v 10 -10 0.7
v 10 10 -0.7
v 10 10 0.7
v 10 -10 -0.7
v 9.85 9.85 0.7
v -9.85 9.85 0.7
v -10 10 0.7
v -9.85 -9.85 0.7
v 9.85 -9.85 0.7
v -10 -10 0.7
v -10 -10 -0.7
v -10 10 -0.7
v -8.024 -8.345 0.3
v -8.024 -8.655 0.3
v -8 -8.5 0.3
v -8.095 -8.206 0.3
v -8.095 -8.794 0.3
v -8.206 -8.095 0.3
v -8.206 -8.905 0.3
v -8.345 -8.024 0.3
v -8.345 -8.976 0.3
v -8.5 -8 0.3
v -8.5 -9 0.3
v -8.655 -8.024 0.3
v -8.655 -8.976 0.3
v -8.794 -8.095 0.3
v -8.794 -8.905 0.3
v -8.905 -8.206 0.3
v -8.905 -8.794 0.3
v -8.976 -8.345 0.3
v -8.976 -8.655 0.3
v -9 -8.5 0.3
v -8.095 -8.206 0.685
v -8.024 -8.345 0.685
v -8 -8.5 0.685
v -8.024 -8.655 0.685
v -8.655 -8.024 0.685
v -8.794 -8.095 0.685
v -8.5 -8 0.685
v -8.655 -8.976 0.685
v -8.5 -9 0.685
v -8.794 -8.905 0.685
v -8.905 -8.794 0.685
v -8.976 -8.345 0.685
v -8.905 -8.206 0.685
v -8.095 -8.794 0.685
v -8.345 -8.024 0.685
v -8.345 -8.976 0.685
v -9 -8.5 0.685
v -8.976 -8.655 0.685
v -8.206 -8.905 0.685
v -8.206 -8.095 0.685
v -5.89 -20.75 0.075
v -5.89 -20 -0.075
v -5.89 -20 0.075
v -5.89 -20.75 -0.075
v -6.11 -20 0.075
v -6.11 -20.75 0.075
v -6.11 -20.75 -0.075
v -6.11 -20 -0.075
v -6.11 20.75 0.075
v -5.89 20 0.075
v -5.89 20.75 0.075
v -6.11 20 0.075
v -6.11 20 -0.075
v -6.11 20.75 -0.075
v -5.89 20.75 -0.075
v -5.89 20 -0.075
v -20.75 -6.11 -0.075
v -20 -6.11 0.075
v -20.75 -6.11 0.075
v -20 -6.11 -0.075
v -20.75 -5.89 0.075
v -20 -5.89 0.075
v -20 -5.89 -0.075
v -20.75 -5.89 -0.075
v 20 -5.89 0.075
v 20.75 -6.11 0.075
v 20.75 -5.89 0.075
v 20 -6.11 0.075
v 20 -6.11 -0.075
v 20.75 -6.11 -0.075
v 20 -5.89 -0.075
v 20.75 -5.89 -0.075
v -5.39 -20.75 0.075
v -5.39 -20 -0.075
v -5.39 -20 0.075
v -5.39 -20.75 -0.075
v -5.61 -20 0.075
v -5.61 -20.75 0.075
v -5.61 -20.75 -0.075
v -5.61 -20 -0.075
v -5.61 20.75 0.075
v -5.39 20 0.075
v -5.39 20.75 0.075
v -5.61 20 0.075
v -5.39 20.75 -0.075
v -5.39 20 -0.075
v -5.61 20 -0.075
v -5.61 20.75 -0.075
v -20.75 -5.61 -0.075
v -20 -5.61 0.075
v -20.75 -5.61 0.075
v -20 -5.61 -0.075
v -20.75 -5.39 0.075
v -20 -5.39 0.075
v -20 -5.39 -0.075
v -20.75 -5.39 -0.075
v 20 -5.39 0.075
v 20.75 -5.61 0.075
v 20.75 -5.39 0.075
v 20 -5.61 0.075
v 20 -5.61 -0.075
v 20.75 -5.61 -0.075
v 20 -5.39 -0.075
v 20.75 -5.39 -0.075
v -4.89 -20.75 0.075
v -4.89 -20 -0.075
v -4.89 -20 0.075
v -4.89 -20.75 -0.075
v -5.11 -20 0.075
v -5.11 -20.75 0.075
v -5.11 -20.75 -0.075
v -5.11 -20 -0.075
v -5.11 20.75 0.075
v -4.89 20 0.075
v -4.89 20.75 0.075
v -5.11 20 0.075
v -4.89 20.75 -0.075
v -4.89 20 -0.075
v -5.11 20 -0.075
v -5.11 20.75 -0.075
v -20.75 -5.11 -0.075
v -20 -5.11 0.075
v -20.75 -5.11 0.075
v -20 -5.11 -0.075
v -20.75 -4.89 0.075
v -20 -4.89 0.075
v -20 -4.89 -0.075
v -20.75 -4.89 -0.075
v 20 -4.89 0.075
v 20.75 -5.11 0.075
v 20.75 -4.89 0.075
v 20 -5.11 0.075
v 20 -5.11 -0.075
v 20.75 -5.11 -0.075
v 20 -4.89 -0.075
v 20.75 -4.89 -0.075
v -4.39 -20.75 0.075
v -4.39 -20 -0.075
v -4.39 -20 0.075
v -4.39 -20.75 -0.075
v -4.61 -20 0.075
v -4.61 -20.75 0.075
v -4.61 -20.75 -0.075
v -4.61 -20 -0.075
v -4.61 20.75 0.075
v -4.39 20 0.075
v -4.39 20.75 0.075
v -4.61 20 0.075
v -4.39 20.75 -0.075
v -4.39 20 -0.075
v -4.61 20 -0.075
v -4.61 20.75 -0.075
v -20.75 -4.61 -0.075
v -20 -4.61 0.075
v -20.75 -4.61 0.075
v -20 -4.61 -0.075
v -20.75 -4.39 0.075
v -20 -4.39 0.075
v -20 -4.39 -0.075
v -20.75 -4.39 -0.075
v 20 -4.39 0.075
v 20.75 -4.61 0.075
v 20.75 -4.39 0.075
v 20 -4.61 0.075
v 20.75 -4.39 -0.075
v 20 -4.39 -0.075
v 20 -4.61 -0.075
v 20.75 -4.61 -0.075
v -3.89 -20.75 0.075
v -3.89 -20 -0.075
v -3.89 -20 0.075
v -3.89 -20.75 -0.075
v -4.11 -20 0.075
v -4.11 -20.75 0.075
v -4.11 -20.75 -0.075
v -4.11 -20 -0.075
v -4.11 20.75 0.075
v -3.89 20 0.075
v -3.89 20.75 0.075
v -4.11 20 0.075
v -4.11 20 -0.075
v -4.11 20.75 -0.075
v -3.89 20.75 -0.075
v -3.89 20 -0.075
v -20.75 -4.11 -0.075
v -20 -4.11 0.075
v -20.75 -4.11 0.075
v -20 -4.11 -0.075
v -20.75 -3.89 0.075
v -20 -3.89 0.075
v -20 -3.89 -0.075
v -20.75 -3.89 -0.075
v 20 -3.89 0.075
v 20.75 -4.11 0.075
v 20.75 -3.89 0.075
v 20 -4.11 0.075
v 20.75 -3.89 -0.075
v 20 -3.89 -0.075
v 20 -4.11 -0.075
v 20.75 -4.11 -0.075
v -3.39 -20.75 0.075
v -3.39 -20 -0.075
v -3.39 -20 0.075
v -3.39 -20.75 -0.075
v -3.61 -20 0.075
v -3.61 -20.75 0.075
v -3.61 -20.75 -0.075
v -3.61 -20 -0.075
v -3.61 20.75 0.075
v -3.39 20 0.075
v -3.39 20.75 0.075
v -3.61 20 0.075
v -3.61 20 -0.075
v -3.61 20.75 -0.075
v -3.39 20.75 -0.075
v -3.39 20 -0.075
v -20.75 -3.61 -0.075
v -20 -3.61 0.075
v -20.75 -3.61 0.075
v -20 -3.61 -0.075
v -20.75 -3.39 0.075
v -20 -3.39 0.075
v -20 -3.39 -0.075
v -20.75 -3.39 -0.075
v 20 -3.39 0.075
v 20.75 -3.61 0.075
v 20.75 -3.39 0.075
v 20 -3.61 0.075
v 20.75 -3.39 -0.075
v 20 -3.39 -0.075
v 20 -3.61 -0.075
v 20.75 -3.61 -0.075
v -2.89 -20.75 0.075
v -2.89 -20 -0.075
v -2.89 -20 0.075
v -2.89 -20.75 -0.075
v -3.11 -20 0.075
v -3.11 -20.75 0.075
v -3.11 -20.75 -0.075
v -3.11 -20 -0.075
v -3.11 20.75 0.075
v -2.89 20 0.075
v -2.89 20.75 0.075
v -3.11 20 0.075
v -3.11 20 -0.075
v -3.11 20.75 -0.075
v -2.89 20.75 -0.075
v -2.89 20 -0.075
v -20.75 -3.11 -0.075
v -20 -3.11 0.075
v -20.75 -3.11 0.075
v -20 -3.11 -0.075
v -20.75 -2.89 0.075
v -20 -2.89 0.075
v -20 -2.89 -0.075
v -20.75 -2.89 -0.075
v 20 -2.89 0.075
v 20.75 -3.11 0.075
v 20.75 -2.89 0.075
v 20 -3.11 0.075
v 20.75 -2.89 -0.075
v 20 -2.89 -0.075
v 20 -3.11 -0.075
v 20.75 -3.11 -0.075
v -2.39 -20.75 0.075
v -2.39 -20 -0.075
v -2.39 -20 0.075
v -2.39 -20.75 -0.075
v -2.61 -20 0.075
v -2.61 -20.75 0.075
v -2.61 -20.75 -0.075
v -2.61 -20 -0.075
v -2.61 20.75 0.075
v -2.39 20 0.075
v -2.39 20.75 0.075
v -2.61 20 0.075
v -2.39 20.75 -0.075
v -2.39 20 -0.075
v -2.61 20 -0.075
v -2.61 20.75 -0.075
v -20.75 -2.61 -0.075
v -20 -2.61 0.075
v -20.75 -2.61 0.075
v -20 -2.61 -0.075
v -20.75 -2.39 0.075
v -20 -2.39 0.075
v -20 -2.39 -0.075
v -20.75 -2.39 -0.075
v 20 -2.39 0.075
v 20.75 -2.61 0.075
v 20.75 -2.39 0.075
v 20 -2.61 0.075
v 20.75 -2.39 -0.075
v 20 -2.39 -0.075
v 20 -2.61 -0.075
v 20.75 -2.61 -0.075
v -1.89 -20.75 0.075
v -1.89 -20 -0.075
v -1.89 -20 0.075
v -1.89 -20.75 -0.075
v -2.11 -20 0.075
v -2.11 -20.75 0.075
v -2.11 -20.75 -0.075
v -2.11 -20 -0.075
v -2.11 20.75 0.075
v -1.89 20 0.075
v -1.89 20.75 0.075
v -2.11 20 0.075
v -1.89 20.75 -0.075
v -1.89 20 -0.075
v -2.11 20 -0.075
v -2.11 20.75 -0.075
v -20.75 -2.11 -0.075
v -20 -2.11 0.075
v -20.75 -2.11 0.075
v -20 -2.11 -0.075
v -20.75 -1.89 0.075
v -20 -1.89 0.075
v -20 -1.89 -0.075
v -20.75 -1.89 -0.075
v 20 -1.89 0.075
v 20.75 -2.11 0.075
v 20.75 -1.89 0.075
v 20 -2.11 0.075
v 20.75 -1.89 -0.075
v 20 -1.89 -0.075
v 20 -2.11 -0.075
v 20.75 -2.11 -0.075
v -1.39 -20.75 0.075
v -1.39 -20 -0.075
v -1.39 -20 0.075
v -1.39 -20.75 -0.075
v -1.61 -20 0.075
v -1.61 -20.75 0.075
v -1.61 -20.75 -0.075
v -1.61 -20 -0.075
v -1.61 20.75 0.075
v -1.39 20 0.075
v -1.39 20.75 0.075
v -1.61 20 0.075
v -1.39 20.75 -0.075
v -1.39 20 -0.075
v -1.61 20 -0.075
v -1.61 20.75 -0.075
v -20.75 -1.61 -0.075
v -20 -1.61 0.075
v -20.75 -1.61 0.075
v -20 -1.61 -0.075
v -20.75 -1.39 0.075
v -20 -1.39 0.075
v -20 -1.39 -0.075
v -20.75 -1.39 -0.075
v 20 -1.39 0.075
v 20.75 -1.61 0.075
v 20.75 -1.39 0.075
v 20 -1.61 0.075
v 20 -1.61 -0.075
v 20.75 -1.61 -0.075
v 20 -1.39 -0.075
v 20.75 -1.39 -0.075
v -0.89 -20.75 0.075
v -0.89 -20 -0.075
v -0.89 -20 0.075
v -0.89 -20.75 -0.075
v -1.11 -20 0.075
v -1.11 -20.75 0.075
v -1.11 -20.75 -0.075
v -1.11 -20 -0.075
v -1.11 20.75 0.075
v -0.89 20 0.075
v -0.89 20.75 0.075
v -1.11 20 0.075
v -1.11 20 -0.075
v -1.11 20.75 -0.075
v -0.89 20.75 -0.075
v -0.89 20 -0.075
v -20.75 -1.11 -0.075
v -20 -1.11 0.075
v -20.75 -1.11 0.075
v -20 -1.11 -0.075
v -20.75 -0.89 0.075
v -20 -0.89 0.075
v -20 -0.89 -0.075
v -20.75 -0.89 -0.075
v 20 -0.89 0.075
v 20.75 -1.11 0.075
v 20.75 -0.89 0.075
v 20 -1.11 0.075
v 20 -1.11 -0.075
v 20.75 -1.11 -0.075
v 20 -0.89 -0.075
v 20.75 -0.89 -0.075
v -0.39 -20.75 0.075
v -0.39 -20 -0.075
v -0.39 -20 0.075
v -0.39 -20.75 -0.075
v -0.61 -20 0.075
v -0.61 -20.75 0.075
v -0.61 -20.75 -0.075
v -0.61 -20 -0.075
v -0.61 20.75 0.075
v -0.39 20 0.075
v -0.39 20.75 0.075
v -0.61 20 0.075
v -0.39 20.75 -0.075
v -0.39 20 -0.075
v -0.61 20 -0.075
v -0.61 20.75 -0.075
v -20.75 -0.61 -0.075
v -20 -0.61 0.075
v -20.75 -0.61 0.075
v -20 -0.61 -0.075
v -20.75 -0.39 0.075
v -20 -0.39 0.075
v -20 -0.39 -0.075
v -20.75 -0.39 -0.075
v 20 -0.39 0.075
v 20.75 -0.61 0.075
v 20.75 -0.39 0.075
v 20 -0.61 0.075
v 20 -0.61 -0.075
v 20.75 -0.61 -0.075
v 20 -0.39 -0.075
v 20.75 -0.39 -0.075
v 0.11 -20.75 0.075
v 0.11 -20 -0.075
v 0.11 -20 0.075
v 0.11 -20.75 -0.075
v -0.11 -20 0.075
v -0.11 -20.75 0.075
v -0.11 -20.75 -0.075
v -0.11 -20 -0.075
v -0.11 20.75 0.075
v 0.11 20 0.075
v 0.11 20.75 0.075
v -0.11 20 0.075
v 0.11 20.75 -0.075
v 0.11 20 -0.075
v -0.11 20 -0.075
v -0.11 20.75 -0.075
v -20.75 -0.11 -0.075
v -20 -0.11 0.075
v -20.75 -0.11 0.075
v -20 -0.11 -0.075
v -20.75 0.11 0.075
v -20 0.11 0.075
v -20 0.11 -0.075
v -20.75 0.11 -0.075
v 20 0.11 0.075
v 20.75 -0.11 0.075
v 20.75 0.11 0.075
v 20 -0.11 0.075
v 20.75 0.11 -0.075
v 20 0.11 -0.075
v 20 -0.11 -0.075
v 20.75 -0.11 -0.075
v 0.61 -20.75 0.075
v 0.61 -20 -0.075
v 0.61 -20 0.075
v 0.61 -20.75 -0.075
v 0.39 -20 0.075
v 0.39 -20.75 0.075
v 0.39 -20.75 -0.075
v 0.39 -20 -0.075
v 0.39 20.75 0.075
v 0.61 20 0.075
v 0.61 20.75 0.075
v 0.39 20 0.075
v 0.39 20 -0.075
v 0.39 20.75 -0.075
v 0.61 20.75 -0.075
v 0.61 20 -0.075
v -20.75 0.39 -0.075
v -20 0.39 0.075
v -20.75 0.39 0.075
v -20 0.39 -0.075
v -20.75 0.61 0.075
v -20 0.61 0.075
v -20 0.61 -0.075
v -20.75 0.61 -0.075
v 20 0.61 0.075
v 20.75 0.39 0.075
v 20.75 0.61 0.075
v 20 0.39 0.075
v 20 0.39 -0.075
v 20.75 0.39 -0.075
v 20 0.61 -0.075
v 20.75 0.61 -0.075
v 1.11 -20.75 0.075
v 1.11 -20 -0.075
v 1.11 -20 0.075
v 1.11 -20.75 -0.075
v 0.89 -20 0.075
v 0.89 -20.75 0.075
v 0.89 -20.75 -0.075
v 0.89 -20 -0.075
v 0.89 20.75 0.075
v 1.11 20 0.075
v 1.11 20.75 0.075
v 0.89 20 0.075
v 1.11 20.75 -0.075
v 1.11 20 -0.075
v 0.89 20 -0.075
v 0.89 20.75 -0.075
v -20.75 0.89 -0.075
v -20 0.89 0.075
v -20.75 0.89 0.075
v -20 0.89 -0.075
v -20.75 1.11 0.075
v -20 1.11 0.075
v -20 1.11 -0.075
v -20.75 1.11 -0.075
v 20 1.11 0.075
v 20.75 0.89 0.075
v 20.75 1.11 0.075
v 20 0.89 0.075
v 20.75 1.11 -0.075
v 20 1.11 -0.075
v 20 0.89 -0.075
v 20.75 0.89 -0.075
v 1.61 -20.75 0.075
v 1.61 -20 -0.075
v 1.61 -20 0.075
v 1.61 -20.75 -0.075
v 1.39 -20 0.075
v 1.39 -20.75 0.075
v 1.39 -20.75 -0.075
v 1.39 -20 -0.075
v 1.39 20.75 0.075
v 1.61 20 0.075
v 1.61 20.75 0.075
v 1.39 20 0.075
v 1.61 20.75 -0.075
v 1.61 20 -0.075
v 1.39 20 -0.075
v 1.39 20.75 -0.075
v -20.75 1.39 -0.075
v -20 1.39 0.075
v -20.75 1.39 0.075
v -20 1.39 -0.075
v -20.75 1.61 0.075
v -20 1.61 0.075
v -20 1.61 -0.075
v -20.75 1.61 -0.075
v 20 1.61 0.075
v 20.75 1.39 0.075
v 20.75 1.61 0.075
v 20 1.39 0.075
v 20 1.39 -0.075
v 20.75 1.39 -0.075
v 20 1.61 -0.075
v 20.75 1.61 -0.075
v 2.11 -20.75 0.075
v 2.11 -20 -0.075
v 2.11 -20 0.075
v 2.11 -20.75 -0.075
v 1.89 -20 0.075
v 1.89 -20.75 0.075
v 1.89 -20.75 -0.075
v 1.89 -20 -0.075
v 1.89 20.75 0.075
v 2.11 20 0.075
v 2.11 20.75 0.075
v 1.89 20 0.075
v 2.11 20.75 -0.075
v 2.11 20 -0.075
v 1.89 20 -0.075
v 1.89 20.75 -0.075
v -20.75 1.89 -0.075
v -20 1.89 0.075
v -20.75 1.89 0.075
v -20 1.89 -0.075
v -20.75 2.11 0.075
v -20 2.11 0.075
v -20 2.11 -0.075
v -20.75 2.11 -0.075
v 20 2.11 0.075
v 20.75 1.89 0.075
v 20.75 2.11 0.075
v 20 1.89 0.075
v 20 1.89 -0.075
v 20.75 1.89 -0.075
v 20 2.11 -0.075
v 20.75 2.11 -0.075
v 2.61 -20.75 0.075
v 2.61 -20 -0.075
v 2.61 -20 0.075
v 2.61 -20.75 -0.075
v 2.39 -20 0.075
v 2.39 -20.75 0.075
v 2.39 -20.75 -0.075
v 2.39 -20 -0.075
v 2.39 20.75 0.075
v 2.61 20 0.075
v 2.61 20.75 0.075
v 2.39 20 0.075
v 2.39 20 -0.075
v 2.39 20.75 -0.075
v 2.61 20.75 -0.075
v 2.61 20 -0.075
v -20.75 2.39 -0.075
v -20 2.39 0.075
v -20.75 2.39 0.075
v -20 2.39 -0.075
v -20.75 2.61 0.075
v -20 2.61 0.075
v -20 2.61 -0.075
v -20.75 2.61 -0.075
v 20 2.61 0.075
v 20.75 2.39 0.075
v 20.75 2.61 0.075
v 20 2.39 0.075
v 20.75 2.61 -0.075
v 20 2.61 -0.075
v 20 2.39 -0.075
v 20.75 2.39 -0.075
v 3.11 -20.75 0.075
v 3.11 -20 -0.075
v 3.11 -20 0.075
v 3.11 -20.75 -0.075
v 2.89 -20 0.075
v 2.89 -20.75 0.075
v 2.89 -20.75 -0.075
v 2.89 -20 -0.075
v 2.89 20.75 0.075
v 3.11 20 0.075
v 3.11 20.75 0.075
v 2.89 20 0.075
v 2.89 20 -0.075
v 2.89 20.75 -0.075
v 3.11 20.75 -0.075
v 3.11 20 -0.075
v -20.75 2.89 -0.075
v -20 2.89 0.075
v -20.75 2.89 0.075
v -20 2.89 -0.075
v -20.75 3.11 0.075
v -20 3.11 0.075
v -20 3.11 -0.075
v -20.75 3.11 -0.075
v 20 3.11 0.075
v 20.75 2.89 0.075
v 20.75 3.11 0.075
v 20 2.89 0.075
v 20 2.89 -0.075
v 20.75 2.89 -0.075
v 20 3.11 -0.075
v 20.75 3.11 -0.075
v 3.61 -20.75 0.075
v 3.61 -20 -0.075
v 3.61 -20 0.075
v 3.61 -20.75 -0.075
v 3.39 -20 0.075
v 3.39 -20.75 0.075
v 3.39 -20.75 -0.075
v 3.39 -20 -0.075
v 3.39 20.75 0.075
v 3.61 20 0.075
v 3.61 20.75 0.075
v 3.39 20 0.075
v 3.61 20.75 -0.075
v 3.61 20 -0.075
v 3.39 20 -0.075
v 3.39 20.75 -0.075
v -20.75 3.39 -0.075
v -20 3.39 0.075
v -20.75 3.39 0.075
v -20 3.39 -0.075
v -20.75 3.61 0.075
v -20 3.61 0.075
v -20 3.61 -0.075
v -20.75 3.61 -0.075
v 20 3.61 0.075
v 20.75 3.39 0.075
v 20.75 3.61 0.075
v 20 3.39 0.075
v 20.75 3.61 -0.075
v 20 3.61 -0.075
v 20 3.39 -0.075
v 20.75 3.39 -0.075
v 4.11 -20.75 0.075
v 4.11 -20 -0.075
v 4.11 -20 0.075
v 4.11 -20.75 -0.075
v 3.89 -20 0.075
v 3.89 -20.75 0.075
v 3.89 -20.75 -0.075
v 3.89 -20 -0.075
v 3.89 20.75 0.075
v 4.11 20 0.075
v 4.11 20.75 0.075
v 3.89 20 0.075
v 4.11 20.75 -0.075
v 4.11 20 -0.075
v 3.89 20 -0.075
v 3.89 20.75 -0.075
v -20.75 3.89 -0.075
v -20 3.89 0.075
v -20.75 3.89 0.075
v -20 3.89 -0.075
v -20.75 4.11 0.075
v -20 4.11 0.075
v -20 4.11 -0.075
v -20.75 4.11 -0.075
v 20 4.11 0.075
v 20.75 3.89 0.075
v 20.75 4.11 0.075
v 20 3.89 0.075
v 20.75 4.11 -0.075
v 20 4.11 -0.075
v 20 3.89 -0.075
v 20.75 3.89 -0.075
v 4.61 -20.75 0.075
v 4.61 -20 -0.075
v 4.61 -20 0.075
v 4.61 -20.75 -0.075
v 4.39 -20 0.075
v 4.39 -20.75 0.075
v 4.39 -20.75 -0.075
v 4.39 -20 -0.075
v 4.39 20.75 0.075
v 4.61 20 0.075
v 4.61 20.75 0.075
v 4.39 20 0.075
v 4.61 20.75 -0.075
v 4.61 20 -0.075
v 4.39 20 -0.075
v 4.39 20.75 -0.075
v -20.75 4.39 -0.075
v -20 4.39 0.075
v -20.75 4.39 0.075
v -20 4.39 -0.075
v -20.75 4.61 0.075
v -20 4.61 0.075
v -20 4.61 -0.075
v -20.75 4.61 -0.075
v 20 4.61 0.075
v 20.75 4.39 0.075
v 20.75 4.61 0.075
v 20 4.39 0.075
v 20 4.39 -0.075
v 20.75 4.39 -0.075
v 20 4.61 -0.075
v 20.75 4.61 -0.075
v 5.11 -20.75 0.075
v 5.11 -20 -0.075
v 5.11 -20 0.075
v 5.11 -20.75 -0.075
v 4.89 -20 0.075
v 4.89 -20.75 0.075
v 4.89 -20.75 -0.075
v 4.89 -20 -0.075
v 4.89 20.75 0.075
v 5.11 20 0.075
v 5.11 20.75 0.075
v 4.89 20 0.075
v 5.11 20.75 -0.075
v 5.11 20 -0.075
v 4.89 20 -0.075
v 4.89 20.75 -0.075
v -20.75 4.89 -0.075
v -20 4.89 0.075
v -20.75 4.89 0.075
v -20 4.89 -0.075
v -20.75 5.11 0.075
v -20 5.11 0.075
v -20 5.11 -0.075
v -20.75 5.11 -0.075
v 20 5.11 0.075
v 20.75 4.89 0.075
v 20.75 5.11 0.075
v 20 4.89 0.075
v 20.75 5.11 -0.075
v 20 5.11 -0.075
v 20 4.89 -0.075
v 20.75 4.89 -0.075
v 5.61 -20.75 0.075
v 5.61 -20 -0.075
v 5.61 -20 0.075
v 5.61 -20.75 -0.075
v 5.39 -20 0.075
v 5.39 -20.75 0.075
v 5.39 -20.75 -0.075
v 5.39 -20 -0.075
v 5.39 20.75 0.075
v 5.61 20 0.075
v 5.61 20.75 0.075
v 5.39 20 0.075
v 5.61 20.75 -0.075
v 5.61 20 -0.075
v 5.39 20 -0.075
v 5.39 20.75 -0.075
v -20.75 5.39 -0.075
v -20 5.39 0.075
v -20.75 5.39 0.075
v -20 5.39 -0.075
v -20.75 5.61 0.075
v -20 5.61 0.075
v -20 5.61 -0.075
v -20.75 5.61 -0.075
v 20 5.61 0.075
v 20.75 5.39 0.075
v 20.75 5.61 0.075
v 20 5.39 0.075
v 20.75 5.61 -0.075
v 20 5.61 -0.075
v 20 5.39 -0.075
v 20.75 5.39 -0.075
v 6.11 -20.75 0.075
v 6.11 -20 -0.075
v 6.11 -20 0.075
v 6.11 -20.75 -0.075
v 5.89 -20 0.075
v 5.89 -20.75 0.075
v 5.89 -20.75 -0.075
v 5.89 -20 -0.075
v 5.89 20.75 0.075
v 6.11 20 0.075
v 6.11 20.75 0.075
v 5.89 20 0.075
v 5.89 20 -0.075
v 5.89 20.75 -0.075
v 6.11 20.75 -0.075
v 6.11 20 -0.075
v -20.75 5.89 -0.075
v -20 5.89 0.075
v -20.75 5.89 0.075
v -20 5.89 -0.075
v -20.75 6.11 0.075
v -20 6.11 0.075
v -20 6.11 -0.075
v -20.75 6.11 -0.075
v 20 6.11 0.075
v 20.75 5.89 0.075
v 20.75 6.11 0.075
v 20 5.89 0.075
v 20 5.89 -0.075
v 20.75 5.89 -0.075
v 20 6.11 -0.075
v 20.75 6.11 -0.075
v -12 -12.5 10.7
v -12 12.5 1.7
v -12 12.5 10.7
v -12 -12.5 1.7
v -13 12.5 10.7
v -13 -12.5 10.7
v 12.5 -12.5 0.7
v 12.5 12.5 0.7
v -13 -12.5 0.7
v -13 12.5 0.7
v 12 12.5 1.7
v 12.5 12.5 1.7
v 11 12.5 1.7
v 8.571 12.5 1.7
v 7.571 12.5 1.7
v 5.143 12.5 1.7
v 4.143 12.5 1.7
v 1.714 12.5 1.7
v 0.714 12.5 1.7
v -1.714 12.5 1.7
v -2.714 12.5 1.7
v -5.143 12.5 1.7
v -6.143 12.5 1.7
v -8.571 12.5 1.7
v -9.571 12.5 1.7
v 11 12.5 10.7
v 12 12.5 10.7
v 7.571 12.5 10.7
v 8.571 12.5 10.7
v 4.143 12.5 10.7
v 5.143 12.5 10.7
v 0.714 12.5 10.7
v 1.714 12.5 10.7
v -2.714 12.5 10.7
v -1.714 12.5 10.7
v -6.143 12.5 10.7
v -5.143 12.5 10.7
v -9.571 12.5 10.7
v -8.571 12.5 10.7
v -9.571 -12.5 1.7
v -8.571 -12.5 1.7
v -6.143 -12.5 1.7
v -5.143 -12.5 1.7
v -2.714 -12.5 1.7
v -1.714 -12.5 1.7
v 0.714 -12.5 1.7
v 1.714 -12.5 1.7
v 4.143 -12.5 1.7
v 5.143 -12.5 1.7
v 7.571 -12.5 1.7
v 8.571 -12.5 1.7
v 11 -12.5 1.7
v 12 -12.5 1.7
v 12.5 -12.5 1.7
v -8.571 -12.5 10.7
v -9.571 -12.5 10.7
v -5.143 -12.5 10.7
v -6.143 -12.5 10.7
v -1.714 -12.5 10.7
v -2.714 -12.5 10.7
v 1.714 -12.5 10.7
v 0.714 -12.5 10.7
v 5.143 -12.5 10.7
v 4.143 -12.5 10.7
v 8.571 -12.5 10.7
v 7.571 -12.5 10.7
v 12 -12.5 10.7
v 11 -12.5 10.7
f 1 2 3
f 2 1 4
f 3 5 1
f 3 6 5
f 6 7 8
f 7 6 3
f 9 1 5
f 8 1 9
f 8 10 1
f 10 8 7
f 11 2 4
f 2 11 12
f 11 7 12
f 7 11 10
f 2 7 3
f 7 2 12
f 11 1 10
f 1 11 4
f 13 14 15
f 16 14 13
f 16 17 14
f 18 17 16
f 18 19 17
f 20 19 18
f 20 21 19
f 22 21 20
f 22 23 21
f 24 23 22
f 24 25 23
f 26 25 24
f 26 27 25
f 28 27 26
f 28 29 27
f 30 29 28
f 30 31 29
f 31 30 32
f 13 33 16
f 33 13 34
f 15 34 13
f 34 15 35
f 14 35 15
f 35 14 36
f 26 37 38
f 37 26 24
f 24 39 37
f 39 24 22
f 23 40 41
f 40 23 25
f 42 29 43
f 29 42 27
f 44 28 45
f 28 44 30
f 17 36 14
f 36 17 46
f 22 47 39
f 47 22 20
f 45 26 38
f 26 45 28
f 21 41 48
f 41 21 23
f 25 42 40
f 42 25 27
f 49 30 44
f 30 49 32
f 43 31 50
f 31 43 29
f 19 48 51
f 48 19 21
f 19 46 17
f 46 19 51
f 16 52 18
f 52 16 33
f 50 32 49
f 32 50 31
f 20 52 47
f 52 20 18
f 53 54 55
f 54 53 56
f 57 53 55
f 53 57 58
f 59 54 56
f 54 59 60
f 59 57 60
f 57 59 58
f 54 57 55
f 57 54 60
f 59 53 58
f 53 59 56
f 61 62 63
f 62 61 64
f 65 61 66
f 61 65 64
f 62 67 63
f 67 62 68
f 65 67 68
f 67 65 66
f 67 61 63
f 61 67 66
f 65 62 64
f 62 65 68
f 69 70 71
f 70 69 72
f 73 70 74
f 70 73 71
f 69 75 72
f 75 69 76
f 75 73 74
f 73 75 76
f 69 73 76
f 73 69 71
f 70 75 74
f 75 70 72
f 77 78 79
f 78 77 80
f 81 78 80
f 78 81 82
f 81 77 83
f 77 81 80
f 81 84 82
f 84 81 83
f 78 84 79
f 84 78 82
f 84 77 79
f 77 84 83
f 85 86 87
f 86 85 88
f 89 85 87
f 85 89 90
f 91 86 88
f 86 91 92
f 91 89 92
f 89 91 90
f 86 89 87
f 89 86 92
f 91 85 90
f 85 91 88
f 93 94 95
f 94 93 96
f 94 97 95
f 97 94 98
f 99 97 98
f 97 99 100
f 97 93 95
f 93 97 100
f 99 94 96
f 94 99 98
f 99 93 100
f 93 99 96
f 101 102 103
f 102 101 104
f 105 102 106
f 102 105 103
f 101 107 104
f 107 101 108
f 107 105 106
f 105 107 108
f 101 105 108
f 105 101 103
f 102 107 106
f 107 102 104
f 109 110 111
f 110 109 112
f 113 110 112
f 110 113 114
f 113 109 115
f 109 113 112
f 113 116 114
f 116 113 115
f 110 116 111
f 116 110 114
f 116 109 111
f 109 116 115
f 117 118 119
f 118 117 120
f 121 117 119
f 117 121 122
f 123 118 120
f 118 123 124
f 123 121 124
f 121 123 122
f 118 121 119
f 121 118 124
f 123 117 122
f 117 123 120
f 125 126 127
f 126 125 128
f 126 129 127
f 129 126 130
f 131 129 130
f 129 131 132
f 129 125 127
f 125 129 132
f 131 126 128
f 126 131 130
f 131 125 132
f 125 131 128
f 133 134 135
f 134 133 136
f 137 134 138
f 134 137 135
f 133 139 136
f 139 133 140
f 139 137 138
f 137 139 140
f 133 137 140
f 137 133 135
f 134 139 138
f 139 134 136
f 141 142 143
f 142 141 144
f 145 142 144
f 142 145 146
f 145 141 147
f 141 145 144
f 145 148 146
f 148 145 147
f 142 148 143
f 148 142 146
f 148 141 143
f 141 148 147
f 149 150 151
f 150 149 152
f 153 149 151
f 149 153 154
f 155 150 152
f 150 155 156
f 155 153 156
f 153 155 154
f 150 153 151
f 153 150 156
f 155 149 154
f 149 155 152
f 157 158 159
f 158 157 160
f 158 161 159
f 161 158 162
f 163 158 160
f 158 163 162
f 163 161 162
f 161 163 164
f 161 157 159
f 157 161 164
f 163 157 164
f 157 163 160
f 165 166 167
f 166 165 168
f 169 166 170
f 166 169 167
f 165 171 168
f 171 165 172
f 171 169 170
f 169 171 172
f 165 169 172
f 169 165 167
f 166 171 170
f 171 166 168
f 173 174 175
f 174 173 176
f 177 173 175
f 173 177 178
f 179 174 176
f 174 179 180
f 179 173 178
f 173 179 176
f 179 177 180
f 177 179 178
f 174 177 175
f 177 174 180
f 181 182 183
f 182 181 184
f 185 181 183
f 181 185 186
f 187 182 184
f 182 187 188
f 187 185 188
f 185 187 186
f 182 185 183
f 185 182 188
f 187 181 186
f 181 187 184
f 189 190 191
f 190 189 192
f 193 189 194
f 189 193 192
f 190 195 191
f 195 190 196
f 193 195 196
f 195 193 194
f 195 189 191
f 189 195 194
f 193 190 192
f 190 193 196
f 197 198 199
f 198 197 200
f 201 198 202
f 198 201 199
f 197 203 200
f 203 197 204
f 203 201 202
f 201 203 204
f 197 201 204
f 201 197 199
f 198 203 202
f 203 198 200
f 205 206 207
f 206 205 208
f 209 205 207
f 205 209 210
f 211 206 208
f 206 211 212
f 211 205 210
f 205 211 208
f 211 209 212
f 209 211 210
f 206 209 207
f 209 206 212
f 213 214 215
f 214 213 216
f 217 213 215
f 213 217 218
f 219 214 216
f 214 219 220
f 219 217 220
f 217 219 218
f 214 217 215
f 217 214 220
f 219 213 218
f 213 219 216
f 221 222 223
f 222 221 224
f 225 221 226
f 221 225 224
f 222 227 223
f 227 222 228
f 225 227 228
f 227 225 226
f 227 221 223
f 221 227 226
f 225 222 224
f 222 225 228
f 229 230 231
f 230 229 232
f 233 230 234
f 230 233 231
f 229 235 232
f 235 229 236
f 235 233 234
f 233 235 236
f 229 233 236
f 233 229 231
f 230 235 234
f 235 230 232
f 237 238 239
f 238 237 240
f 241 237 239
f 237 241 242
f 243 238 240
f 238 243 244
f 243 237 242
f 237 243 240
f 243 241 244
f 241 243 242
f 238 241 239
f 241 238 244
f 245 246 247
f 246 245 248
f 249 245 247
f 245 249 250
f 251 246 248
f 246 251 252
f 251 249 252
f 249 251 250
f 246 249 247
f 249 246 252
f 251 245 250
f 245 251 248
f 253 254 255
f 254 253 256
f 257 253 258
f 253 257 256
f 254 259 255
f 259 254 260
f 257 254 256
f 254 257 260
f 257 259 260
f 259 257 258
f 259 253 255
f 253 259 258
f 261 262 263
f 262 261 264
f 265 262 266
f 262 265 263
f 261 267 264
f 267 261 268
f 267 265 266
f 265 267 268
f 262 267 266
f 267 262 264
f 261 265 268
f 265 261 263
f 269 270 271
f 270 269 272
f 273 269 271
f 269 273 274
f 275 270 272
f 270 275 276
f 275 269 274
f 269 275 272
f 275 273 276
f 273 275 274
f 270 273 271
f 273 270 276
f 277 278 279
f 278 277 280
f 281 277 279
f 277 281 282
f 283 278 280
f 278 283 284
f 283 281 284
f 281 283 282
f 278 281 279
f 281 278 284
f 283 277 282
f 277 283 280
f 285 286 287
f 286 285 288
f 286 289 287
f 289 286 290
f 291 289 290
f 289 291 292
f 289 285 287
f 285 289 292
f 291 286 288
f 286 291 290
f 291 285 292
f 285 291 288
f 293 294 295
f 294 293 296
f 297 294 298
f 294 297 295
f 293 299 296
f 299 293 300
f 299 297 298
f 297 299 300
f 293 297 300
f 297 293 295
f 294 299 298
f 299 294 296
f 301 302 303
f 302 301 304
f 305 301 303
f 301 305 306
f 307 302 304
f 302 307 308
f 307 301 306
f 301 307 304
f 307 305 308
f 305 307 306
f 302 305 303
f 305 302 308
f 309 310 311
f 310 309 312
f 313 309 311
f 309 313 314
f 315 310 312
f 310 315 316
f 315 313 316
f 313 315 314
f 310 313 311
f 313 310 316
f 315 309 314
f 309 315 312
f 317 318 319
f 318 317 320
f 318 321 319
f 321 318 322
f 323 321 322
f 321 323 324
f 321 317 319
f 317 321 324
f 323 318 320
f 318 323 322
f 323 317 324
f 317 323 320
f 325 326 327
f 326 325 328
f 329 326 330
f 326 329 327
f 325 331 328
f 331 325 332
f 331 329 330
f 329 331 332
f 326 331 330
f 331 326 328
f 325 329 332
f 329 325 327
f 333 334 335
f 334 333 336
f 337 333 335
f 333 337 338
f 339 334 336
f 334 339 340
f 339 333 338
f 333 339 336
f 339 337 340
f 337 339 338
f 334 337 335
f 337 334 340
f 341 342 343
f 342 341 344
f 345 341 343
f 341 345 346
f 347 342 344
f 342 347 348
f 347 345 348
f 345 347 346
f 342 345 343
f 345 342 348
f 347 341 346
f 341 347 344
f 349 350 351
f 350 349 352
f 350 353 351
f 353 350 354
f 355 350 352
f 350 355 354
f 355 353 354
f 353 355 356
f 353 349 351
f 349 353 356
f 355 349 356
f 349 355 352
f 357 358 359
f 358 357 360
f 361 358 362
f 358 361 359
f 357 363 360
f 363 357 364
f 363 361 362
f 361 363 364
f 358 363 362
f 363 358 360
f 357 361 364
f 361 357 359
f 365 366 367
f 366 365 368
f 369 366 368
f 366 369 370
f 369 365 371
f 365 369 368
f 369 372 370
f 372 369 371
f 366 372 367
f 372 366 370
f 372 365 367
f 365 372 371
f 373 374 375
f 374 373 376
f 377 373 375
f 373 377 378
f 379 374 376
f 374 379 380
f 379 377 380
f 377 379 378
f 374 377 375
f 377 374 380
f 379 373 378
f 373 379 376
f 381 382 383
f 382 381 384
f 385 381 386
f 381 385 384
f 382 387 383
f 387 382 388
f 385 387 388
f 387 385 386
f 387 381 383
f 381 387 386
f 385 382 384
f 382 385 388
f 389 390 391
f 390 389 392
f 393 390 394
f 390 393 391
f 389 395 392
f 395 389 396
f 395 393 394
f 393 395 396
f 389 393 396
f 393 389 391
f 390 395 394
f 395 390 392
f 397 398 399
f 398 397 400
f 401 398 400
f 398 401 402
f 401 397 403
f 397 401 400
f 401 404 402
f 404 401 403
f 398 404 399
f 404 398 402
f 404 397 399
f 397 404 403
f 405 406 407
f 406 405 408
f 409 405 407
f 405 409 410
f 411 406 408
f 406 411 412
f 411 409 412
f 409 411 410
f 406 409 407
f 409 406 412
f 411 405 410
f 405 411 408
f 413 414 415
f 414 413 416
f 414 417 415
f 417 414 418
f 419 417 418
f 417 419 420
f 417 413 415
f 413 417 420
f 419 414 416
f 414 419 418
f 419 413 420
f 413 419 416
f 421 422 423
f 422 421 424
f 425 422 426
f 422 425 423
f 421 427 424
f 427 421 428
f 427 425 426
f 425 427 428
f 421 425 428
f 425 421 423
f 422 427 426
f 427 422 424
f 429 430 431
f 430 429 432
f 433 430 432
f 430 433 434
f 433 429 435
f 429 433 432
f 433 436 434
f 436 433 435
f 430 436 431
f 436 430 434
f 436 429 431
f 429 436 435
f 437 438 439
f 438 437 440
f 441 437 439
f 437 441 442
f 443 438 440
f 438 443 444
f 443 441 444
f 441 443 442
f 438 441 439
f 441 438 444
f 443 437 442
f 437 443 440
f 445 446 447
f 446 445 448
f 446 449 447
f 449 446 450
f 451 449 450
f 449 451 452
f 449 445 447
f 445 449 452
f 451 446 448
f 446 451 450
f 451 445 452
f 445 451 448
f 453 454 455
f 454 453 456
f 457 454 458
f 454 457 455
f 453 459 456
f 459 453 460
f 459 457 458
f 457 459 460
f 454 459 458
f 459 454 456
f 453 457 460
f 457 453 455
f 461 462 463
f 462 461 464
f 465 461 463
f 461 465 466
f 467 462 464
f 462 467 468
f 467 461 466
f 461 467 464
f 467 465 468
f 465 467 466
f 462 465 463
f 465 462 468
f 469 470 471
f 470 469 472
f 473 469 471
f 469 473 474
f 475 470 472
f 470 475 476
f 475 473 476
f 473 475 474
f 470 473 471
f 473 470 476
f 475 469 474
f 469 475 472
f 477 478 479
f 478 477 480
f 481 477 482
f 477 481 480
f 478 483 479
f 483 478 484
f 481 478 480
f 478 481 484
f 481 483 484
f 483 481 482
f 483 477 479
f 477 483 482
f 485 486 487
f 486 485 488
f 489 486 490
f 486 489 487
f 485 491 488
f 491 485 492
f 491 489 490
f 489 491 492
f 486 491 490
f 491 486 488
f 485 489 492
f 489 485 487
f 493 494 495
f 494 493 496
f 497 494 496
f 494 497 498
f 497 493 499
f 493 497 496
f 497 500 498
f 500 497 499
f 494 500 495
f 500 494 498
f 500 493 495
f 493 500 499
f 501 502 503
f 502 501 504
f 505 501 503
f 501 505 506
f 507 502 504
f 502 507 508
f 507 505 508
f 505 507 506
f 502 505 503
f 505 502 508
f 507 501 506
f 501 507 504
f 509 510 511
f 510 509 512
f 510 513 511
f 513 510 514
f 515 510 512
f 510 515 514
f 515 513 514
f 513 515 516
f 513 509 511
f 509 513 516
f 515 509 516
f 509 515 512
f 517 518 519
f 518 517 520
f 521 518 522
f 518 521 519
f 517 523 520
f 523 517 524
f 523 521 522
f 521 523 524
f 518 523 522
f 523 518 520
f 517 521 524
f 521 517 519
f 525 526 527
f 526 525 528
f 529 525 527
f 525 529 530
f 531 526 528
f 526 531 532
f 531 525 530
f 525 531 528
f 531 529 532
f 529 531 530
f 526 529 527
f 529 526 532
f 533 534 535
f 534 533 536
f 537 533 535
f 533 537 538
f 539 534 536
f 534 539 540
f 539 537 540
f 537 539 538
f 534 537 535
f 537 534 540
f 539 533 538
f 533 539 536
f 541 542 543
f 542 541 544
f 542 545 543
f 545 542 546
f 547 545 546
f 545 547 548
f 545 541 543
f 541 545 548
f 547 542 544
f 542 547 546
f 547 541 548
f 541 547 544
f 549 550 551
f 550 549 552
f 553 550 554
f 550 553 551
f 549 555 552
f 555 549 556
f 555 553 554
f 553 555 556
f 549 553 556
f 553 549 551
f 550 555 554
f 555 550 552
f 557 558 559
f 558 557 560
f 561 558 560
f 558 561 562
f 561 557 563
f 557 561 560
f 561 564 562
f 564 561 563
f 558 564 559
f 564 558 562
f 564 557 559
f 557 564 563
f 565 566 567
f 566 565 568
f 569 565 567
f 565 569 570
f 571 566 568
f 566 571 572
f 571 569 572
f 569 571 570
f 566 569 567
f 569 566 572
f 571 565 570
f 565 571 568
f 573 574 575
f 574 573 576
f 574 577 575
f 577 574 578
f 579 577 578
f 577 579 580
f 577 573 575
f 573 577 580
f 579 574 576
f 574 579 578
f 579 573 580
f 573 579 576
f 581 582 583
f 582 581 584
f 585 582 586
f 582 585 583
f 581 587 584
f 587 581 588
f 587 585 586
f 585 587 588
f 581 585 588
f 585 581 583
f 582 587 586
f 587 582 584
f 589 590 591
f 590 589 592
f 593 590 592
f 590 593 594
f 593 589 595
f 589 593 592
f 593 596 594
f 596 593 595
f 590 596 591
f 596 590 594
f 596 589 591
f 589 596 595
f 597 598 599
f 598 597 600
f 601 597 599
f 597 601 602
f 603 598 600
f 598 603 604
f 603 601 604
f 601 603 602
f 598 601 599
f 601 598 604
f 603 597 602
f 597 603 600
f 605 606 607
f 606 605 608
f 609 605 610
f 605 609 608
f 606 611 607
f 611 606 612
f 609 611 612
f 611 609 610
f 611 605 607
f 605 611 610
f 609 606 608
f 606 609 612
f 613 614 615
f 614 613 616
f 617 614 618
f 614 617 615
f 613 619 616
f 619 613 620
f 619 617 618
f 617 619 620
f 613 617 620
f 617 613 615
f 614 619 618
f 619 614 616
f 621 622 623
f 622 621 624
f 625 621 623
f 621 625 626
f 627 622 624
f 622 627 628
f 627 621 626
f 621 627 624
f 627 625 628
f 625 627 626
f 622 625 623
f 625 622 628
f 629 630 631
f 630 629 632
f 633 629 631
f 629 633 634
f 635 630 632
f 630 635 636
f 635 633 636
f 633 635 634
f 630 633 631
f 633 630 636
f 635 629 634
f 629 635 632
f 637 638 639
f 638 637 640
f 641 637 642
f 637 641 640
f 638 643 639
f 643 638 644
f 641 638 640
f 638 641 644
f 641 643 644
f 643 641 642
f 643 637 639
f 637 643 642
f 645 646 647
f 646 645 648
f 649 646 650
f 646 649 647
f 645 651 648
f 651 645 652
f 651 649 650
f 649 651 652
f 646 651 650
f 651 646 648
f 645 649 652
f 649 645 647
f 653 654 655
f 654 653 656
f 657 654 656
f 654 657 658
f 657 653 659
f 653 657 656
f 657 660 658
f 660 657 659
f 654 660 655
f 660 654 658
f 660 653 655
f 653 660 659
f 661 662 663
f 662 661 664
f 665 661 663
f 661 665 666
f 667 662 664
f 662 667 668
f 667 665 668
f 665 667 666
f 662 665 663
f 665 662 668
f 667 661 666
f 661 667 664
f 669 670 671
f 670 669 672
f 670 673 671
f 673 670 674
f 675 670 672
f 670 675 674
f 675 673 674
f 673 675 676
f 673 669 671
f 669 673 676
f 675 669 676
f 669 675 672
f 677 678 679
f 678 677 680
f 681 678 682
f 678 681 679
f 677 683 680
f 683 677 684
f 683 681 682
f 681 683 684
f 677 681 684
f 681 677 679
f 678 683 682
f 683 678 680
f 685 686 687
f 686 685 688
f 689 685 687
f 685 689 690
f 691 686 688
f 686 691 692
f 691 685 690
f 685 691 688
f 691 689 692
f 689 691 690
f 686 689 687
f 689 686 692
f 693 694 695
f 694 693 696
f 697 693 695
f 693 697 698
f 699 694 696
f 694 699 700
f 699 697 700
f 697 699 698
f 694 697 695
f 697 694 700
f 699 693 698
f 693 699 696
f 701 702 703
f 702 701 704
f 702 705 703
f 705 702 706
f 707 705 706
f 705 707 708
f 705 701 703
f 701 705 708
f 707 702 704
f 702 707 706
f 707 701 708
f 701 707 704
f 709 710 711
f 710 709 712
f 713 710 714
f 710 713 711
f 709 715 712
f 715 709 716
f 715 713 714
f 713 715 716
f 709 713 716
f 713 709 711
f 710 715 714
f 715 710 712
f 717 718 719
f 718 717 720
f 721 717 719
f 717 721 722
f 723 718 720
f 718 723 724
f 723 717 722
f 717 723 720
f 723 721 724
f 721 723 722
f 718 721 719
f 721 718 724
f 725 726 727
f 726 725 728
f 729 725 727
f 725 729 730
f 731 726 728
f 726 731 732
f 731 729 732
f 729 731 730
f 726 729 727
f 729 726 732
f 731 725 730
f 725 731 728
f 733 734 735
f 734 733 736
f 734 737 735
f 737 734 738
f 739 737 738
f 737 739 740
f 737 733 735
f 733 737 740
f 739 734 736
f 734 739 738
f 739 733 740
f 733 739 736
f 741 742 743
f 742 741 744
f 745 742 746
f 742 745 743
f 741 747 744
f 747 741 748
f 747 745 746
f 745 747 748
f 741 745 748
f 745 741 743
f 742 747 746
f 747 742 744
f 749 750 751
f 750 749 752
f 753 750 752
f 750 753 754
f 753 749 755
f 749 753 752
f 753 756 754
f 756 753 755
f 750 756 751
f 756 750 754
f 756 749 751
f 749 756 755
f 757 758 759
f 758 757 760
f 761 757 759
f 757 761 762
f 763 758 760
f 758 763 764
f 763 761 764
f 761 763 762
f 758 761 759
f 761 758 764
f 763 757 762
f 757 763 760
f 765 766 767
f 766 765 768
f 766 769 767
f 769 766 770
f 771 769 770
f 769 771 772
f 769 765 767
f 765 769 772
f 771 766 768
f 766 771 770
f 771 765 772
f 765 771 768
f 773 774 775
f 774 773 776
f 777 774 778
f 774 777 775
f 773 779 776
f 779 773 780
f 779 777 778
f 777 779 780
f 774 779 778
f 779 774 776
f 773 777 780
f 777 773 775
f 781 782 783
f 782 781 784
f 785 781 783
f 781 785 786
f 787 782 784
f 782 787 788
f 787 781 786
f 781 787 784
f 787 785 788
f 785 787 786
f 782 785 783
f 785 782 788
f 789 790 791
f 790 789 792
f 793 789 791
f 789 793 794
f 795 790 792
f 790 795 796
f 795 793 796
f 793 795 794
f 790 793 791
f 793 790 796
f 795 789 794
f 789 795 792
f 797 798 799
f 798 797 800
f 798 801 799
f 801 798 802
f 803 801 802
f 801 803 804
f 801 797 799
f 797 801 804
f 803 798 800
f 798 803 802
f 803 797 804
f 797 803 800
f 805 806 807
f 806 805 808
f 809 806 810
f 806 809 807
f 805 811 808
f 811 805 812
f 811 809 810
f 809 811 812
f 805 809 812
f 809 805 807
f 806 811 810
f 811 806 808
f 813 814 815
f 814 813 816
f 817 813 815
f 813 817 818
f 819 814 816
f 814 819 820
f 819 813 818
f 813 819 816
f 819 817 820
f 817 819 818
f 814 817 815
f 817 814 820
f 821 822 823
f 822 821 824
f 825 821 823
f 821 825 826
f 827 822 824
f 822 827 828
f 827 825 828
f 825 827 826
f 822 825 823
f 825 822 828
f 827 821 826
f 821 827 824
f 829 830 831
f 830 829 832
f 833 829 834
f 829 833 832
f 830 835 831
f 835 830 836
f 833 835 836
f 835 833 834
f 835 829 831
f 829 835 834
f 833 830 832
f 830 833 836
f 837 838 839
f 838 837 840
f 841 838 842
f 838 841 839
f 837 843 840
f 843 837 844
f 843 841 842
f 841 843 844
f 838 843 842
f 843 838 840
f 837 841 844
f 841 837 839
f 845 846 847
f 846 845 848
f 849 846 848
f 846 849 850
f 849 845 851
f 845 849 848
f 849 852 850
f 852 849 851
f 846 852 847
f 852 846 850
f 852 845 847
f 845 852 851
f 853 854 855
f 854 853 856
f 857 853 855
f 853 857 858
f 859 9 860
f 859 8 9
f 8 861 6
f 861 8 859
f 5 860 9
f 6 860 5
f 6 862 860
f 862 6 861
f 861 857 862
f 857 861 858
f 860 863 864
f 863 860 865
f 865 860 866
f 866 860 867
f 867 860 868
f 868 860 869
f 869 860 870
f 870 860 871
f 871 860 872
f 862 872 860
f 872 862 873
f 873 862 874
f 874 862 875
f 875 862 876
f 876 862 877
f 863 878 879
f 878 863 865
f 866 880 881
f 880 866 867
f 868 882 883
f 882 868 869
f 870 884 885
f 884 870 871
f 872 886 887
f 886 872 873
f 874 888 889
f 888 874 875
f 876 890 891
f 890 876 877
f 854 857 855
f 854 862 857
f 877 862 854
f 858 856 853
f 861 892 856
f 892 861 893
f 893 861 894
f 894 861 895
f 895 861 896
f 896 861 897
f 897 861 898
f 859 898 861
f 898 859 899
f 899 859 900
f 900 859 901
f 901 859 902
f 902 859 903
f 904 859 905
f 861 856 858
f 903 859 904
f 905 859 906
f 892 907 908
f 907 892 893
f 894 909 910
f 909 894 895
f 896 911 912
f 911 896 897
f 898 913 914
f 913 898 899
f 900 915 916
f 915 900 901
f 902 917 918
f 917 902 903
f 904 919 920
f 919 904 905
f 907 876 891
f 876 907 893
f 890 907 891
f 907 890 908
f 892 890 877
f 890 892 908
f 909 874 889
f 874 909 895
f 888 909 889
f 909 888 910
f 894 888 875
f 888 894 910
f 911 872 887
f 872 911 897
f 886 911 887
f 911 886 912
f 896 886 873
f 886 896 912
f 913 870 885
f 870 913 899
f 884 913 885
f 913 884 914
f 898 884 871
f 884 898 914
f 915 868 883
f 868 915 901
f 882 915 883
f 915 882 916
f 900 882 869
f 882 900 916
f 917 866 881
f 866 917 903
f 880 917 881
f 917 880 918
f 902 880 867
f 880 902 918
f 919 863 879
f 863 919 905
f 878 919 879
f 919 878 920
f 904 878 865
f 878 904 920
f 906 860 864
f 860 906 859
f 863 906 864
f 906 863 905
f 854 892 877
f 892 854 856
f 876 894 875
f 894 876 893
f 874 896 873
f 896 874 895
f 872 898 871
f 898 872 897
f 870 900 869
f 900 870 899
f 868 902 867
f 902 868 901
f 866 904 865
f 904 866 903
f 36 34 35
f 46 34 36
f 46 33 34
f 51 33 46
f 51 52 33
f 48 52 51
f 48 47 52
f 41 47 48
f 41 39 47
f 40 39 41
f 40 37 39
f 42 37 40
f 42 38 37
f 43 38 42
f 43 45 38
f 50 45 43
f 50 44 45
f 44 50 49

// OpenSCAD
// Neiler GPU Chip - 3D Model
// 100-pin TQFP package with heatsink
// High-performance graphics processor for Neiler-64

// Parameters
chip_width = 20.0;   // 20mm square body
chip_height = 1.4;   // Body thickness
pin_count = 100;     // 100-pin TQFP
pin_width = 0.22;
pin_length = 0.75;
pin_pitch = 0.5;
pin_thickness = 0.15;
heatsink_size = 25.0;
heatsink_height = 10.0;

module neiler_gpu_chip() {
    color("DarkSlateGray") {
        // Main chip body
        difference() {
            cube([chip_width, chip_width, chip_height], center=true);

            // Pin 1 indicator
            translate([-chip_width/2 + 1.5, -chip_width/2 + 1.5, chip_height/2 - 0.2])
                cylinder(r=0.5, h=0.4, center=true, $fn=20);
        }
    }

    // Top surface with markings
    color("Black")
    translate([0, 0, chip_height/2 + 0.01])
        cube([chip_width - 0.3, chip_width - 0.3, 0.05], center=true);

    // GPU markings
    color("Cyan") {
        translate([0, 5, chip_height/2 + 0.06])
            linear_extrude(height=0.05)
            text("NEILER", size=2.5, halign="center", valign="center", font="Liberation Sans:style=Bold");

        translate([0, 1.5, chip_height/2 + 0.06])
            linear_extrude(height=0.05)
            text("GPU-64", size=3, halign="center", valign="center", font="Liberation Sans:style=Bold");

        translate([0, -2, chip_height/2 + 0.06])
            linear_extrude(height=0.05)
            text("320x200/640x480", size=1.2, halign="center", valign="center");

        translate([0, -4, chip_height/2 + 0.06])
            linear_extrude(height=0.05)
            text("NG-001", size=1.5, halign="center", valign="center");
    }

    // Generate TQFP pins (gull-wing style)
    color("Silver") {
        pins_per_side = pin_count / 4;
        for(i = [0 : pins_per_side - 1]) {
            offset = -chip_width/2 + (chip_width - (pins_per_side-1)*pin_pitch)/2 + i*pin_pitch;

            // Bottom edge
            translate([offset, -chip_width/2, 0])
                tqfp_pin();
            // Top edge
            translate([offset, chip_width/2, 0])
                rotate([0, 0, 180])
                tqfp_pin();
            // Left edge
            translate([-chip_width/2, offset, 0])
                rotate([0, 0, -90])
                tqfp_pin();
            // Right edge
            translate([chip_width/2, offset, 0])
                rotate([0, 0, 90])
                tqfp_pin();
        }
    }

    // Optional heatsink
    color("Silver", 0.7)
    translate([0, 0, chip_height/2 + heatsink_height/2])
        heatsink();
}

module tqfp_pin() {
    // Gull-wing pin profile
    translate([0, -chip_width/2 - pin_length/2, 0])
        cube([pin_width, pin_length, pin_thickness], center=true);
}

module heatsink() {
    fin_count = 8;
    fin_thickness = 1.0;
    fin_spacing = (heatsink_size - fin_count*fin_thickness) / (fin_count - 1);

    // Base plate
    translate([0, 0, -heatsink_height/2 + 0.5])
        cube([heatsink_size, heatsink_size, 1], center=true);

    // Fins
    for(i = [0 : fin_count - 1]) {
        translate([- heatsink_size/2 + i*(fin_thickness + fin_spacing), 0, 0])
            cube([fin_thickness, heatsink_size, heatsink_height], center=true);
    }
}

// Render GPU
neiler_gpu_chip();
